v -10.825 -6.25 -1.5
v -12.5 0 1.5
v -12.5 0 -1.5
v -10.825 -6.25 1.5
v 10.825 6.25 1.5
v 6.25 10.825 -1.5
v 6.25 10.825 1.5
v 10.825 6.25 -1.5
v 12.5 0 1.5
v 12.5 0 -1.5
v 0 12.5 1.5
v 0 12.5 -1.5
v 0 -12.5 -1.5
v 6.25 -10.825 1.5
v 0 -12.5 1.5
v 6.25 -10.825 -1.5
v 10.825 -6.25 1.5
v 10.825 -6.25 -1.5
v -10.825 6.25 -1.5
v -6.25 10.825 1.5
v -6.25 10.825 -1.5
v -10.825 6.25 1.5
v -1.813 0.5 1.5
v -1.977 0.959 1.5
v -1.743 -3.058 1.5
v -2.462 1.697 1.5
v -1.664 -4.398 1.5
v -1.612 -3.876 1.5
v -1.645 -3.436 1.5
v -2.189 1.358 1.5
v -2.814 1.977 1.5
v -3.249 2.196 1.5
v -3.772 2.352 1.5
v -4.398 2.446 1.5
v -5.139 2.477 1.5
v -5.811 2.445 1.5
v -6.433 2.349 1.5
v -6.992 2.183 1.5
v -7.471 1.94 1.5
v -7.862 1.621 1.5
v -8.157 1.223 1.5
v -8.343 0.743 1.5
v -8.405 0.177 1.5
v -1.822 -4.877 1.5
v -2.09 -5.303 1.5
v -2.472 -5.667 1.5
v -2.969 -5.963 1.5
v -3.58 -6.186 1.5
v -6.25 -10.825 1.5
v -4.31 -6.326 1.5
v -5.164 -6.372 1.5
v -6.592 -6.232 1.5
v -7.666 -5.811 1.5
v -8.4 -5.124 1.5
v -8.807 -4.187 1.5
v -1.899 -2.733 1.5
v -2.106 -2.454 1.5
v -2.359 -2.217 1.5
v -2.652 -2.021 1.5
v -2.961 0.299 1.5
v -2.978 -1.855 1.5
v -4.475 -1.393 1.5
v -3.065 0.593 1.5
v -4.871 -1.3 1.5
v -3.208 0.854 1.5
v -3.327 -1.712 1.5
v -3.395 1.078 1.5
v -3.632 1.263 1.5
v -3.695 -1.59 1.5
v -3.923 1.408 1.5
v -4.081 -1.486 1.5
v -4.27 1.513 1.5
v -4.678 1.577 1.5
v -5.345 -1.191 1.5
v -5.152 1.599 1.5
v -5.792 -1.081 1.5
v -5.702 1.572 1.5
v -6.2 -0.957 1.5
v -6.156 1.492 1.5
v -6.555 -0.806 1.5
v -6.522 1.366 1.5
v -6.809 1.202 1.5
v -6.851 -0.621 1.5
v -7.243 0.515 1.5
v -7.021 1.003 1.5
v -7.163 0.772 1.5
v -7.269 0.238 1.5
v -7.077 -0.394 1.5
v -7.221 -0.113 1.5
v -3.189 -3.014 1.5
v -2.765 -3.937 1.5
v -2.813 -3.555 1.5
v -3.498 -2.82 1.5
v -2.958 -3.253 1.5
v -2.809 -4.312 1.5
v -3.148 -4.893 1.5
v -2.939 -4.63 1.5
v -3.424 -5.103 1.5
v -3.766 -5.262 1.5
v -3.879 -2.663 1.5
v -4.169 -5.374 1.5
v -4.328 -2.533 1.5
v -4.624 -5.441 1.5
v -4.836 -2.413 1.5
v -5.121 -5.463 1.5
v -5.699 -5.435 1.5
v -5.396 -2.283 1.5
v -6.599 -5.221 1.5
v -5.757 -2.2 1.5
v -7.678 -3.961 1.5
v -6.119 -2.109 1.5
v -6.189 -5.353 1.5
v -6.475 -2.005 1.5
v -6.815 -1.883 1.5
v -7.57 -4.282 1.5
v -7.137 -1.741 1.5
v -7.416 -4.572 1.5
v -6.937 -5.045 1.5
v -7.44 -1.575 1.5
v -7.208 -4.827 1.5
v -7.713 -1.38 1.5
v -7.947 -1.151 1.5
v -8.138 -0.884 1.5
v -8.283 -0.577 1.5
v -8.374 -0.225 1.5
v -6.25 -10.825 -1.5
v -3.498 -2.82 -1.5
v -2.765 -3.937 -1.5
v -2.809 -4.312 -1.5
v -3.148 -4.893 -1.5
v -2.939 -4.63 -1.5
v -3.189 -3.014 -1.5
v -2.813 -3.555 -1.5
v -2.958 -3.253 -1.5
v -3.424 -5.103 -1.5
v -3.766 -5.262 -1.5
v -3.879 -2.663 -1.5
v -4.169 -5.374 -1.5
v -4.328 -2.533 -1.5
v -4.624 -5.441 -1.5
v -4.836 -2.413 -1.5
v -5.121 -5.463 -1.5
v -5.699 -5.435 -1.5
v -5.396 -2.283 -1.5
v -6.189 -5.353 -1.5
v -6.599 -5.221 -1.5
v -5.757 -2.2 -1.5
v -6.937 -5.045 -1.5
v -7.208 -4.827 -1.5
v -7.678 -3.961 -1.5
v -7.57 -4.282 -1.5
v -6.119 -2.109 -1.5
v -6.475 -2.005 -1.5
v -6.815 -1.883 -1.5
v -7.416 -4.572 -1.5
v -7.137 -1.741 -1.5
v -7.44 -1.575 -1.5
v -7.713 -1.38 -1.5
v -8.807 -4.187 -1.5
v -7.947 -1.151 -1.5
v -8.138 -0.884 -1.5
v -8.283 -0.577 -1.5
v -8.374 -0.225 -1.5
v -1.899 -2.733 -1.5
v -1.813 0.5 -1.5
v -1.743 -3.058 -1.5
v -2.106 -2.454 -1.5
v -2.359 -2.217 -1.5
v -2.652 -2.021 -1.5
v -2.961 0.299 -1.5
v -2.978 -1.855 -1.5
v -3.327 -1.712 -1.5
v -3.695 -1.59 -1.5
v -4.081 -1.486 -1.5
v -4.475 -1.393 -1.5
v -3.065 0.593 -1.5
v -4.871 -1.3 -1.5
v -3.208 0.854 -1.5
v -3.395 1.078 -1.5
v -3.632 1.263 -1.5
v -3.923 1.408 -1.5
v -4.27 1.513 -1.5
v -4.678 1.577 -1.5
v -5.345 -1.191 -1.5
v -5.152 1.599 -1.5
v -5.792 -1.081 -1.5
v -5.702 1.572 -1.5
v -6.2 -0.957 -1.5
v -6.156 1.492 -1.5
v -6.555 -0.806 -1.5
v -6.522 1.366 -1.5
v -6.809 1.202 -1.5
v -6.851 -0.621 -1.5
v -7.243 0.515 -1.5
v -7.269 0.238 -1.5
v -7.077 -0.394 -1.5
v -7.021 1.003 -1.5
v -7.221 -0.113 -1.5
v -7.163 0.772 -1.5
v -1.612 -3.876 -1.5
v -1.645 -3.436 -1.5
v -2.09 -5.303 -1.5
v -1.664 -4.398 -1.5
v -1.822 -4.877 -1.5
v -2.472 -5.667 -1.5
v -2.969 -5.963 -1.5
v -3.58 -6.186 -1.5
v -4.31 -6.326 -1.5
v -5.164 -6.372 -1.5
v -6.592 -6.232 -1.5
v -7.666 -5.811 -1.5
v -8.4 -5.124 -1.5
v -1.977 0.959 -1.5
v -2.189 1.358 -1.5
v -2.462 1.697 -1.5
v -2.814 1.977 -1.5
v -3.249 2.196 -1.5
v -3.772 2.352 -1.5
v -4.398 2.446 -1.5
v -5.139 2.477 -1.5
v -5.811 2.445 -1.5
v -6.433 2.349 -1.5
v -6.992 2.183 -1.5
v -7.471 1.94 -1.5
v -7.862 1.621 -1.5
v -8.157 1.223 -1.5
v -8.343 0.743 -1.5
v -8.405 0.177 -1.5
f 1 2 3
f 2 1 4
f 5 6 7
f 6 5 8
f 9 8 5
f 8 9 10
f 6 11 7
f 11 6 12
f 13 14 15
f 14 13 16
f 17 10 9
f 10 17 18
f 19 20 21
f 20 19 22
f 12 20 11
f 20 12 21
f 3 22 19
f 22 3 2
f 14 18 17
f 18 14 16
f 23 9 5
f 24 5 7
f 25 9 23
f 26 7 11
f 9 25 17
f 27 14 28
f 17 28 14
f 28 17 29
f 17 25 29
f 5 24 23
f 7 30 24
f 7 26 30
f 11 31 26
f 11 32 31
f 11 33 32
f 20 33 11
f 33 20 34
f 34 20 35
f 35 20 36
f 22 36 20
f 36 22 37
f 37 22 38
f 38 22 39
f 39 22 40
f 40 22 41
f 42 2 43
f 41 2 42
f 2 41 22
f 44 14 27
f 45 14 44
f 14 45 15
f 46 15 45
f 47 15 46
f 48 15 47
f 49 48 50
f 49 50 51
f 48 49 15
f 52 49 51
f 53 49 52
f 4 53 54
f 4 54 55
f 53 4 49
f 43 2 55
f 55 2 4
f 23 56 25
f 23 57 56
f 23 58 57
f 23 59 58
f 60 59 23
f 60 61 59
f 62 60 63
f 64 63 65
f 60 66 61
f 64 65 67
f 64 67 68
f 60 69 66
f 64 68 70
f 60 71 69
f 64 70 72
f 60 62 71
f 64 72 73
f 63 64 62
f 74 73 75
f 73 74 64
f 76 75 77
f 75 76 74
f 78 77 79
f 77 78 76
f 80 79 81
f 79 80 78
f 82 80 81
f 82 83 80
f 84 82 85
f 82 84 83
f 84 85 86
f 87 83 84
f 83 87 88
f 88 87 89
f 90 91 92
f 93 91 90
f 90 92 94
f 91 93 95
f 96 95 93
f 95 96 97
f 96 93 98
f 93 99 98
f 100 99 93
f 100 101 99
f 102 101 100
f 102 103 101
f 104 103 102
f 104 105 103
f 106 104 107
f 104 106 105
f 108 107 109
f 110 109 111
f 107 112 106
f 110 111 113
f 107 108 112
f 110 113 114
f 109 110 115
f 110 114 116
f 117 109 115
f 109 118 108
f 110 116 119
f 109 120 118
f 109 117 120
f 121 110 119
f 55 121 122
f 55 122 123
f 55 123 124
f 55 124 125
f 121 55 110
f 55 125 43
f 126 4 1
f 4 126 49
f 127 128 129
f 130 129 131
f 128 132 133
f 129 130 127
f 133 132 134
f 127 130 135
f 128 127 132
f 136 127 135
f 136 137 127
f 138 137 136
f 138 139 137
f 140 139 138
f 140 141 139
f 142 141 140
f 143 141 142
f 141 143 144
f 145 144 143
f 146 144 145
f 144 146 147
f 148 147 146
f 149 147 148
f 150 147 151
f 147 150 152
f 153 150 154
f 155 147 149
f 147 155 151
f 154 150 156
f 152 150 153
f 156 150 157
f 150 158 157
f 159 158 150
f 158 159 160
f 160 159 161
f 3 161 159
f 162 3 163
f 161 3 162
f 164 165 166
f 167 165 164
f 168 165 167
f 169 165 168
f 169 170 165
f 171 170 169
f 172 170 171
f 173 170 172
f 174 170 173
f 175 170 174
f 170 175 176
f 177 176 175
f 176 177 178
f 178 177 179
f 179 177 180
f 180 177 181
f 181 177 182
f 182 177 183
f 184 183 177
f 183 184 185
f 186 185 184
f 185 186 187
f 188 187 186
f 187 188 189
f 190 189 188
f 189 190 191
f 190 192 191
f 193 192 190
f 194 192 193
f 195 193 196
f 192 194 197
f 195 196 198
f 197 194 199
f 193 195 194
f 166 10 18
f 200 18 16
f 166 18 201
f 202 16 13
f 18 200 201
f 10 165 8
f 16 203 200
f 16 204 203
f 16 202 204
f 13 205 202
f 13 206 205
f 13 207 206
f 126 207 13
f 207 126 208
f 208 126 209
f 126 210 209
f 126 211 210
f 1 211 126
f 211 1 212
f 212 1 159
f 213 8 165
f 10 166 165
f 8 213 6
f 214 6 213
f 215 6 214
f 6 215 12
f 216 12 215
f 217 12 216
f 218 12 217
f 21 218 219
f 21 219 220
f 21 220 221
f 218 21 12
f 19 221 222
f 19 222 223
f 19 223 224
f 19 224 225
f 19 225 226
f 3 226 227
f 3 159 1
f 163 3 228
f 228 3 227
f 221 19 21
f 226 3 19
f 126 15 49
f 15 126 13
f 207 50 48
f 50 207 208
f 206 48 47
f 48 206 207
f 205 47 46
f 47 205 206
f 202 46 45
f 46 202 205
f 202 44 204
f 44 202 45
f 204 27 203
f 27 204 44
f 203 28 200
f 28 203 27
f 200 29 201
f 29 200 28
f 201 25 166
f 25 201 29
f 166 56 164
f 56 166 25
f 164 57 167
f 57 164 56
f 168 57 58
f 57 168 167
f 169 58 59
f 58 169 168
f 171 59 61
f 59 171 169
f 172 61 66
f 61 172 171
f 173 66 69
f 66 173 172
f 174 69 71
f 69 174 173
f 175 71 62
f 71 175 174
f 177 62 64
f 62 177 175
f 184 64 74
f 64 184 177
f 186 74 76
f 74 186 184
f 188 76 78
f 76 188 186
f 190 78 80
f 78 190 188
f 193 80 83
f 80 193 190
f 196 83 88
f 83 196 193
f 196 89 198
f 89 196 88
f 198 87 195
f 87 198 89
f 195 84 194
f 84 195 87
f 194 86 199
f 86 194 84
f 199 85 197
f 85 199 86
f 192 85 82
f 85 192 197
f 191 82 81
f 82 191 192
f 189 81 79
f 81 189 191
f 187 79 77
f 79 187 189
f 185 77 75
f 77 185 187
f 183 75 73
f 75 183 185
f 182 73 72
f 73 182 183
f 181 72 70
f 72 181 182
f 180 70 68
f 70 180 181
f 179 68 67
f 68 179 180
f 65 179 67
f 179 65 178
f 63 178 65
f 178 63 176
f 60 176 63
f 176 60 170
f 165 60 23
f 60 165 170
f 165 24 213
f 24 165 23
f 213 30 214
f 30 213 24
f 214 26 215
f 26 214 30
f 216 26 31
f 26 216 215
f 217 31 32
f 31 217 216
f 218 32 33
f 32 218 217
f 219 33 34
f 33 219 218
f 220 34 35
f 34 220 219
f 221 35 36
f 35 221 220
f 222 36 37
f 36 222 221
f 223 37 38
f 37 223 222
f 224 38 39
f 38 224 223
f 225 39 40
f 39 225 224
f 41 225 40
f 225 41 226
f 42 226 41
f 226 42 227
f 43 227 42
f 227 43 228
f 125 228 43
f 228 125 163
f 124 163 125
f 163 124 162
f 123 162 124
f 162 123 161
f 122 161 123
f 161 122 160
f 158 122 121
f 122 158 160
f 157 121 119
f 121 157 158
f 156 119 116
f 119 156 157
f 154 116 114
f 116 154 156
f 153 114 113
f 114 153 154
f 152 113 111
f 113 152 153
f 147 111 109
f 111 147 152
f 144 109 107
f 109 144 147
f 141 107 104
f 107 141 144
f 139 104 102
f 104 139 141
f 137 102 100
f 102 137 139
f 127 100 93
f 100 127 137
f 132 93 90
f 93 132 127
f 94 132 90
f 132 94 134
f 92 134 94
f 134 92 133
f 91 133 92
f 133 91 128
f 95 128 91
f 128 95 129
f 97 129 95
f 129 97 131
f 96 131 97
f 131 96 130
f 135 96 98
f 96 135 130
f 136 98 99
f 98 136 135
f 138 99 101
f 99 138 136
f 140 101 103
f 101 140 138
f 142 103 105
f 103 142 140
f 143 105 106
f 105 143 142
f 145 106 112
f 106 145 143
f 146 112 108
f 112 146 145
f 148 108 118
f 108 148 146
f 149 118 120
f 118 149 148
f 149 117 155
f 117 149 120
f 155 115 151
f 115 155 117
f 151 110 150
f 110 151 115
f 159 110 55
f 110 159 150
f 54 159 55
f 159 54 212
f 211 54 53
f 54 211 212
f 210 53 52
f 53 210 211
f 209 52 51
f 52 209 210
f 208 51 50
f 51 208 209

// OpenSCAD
$fn=12;

// unit is mm

diameter = 25;
thickness = 3;
slit_width = 0.8;
arrow_base = 7;

diameter_2 = diameter / 2;


module slot(level) {

  difference() {

    union() {
      cylinder(d=diameter, h=thickness, center=true);
    }

    union() {

      //#translate([ -0.3 * diameter_2, -0.3 * diameter_2, -thickness ])
      //  linear_extrude(2 * thickness)
      //  text("\u26E4", size=10);
      translate([ -0.75 * diameter_2, -0.5 * diameter_2, -thickness ])
        linear_extrude(2 * thickness)
        text(level, size=9);
    }
  }
}

slot("S");
